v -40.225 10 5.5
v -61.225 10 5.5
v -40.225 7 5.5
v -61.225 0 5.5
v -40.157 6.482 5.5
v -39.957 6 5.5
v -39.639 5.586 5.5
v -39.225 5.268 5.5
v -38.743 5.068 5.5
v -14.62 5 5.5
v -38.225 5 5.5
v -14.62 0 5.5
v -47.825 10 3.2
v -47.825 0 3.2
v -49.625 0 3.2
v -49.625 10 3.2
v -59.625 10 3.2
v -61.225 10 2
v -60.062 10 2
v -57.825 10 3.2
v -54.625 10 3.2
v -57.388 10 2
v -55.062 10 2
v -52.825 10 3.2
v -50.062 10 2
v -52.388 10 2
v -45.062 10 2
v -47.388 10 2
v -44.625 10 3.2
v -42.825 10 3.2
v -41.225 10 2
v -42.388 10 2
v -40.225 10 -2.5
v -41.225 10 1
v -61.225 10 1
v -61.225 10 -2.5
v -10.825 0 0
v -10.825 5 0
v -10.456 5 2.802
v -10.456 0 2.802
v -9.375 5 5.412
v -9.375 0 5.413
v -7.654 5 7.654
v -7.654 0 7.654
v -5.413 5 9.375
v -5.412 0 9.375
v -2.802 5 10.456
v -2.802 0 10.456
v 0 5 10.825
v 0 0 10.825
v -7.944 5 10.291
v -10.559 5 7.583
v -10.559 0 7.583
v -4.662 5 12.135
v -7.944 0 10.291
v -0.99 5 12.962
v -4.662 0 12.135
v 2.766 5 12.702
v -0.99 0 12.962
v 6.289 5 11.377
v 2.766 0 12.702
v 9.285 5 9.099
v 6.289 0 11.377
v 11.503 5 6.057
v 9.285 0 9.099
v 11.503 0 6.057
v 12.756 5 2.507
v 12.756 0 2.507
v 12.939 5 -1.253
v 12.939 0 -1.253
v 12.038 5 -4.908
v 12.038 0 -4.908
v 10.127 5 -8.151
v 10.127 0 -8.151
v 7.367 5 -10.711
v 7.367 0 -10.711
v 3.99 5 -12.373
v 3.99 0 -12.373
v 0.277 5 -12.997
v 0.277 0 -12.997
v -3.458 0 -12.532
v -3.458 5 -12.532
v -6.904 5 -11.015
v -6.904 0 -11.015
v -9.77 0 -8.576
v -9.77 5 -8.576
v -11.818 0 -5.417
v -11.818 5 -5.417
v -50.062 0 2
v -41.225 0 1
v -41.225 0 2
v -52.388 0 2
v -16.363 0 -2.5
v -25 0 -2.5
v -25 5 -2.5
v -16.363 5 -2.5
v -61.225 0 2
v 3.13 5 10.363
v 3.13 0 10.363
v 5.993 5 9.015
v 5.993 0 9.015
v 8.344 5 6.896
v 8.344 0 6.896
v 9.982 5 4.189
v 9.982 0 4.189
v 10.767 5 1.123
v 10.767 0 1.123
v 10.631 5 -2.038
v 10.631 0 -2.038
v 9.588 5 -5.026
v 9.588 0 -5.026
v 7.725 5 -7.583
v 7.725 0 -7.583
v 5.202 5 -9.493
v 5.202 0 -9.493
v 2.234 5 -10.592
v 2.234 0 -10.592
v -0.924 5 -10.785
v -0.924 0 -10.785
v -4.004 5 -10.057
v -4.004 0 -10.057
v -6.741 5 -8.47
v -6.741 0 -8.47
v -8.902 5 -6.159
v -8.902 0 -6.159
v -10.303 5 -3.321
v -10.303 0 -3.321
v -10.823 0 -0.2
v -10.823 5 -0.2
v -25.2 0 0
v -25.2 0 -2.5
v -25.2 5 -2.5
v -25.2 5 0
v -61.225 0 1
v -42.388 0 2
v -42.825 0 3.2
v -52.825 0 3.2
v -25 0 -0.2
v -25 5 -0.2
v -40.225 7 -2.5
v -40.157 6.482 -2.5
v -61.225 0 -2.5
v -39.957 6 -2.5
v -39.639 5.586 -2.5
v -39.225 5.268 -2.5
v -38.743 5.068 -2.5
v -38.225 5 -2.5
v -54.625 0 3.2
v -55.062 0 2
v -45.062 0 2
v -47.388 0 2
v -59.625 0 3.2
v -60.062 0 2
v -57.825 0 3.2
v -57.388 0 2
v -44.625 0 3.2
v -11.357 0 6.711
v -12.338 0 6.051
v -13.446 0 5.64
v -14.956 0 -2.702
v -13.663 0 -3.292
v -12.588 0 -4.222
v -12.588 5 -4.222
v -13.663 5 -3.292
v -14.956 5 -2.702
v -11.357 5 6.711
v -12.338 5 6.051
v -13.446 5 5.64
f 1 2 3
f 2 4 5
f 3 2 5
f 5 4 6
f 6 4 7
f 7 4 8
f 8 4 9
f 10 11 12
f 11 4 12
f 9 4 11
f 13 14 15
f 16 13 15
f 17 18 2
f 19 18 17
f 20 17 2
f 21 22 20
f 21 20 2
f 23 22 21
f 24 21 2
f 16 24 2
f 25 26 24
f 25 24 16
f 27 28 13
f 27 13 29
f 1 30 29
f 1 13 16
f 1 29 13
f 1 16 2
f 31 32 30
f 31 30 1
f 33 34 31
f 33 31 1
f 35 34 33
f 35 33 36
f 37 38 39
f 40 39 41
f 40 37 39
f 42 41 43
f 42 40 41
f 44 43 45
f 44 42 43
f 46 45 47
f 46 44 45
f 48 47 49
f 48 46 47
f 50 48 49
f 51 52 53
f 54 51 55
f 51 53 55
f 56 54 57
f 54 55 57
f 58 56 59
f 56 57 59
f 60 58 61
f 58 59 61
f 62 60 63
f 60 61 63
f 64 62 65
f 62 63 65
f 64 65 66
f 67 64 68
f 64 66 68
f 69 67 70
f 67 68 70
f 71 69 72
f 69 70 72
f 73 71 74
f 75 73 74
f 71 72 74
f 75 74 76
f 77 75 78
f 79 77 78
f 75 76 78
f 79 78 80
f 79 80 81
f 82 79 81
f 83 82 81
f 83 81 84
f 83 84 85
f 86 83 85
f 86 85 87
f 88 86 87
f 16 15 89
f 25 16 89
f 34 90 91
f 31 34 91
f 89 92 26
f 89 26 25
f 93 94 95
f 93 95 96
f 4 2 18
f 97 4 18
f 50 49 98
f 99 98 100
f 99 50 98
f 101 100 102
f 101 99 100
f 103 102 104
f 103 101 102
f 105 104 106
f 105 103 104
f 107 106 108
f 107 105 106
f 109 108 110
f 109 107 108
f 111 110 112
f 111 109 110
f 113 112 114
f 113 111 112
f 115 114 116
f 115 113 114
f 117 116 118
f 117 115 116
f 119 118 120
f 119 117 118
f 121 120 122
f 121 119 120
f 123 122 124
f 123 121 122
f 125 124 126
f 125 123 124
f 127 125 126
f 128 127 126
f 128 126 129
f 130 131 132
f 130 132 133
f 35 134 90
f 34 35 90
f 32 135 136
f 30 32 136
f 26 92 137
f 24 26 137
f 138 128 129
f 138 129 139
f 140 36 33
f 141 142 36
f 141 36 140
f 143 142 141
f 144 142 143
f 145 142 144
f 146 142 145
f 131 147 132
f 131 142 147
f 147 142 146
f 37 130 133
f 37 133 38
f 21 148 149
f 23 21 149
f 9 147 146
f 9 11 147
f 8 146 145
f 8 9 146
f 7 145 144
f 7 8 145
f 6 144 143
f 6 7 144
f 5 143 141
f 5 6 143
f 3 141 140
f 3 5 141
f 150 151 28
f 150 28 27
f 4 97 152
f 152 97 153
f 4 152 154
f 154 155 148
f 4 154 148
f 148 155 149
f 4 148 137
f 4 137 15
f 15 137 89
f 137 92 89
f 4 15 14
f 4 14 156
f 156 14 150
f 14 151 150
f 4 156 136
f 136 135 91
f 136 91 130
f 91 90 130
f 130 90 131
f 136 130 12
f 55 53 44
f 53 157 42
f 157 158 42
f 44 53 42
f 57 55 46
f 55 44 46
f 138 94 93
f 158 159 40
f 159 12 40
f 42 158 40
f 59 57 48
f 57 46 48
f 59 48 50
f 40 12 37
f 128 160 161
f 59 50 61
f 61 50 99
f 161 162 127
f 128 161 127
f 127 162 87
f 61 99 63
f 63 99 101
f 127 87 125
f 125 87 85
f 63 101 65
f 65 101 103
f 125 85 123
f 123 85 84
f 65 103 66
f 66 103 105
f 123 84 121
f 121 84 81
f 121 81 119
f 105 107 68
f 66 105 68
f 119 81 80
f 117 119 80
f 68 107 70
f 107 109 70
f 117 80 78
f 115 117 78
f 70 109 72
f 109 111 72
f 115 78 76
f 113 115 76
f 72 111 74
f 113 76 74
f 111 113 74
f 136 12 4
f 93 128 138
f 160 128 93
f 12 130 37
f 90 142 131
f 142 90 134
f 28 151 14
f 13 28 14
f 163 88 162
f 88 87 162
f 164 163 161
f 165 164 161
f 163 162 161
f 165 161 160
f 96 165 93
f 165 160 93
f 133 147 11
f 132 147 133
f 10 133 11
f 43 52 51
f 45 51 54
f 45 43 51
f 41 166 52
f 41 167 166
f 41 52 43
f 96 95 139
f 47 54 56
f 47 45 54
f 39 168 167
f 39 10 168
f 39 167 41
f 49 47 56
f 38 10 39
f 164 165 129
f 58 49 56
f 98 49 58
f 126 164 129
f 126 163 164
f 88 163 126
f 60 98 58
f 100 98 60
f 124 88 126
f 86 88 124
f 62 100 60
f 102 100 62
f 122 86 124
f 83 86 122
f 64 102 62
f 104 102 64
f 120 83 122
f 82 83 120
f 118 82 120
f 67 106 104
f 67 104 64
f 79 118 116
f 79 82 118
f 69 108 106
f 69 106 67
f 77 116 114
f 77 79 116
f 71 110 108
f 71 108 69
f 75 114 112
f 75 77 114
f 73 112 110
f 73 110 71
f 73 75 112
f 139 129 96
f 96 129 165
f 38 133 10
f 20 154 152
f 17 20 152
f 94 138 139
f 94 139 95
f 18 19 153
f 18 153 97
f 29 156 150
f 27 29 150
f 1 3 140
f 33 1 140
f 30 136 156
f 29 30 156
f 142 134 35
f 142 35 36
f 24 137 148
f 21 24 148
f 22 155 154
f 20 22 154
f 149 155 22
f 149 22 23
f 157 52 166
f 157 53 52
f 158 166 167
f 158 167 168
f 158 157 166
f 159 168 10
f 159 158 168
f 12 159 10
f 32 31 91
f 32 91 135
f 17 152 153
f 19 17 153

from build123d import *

# Parameters (mm, degrees)
SKETCH_1_R          = 13
SKETCH_1_R_2        = 10.825
RING_DEPTH          = 5
SKETCH_2_W          = 50
SKETCH_2_H          = 8
STICK_DEPTH         = 5
SKETCH_3_W          = 21
SKETCH_3_H          = 8
KEY_DEPTH           = 10
FILLET_1_R          = 5
FILLET_5_R          = 2
KEY_HOLE_DEPTH      = 64.037665059
KEY_HOLE_DEPTH_BACK = 64.037665059
CUT_EXTRUDE_2_DEPTH = 64.3837299


with BuildPart() as part:
    # Эскиз1 → ring (new body)
    with BuildSketch(Plane(origin=(0, 0, 0), x_dir=(1, 0, 0), z_dir=(0, 1, 0))):
        with Locations(Location((0, 0, 0), (0, 0, 270))):
            Circle(SKETCH_1_R)
        with Locations(Location((0, 0, 0), (0, 0, 270))):
            Circle(SKETCH_1_R_2, mode=Mode.SUBTRACT)
    extrude(amount=RING_DEPTH)

    # Эскиз2 → stick (add)
    with BuildSketch(Plane(origin=(0, 0, 0), x_dir=(1, 0, 0), z_dir=(0, 1, 0))):
        with Locations((-36.22497216, -1.5)):
            Rectangle(SKETCH_2_W, SKETCH_2_H)
    extrude(amount=STICK_DEPTH)

    # Эскиз3 → key (add)
    with BuildSketch(Plane(origin=(0, 0, 0), x_dir=(1, 0, 0), z_dir=(0, 1, 0))):
        with Locations((-50.72497216, -1.5)):
            Rectangle(SKETCH_3_W, SKETCH_3_H)
    extrude(amount=KEY_DEPTH)

    # Скругление1
    fillet_1_edges = [part.edges().sort_by_distance(p)[0] for p in [
        (-11.779218989, 2.5, 5.5),
        (-12.757350822, 2.5, -2.5),
    ]]
    fillet(fillet_1_edges, radius=FILLET_1_R)

    # Скругление5
    fillet_5_edges = [part.edges().sort_by_distance(p)[0] for p in [
        (-40.22497216, 5, 1.5),
    ]]
    fillet(fillet_5_edges, radius=FILLET_5_R)

    # Эскиз4 → key hole (cut, two sides: drawn at the far end of the back side and taken through both)
    with BuildSketch(Plane(origin=(0, 2.5, 0), x_dir=(1, 0, 0), z_dir=(0, 1, 0)).offset(-KEY_HOLE_DEPTH_BACK)):
        Polygon((-61.22497216, -1), (-41.22497216, -1), (-41.22497216, -2), (-42.388207879, -2), (-42.82497216, -3.2), (-44.62497216, -3.2), (-45.061736441, -2), (-46.22497216, -2), (-47.388207879, -2), (-47.82497216, -3.2), (-49.62497216, -3.2), (-50.061736441, -2), (-51.22497216, -2), (-52.388207879, -2), (-52.82497216, -3.2), (-54.62497216, -3.2), (-55.061736441, -2), (-56.22497216, -2), (-57.388207879, -2), (-57.82497216, -3.2), (-59.62497216, -3.2), (-60.061736441, -2), (-61.22497216, -2), align=None)
    extrude(amount=KEY_HOLE_DEPTH + KEY_HOLE_DEPTH_BACK, mode=Mode.SUBTRACT)

    # Эскиз5 → Вытянуть2 (cut, through all)
    with BuildSketch(Plane.XZ):
        Polygon((-25.2, -2.5), (-25.2, 0), (0, 0), (0, -0.2), (-25, -0.2), (-25, -2.5), align=None)
    extrude(amount=-CUT_EXTRUDE_2_DEPTH, mode=Mode.SUBTRACT)


solid = part.part
